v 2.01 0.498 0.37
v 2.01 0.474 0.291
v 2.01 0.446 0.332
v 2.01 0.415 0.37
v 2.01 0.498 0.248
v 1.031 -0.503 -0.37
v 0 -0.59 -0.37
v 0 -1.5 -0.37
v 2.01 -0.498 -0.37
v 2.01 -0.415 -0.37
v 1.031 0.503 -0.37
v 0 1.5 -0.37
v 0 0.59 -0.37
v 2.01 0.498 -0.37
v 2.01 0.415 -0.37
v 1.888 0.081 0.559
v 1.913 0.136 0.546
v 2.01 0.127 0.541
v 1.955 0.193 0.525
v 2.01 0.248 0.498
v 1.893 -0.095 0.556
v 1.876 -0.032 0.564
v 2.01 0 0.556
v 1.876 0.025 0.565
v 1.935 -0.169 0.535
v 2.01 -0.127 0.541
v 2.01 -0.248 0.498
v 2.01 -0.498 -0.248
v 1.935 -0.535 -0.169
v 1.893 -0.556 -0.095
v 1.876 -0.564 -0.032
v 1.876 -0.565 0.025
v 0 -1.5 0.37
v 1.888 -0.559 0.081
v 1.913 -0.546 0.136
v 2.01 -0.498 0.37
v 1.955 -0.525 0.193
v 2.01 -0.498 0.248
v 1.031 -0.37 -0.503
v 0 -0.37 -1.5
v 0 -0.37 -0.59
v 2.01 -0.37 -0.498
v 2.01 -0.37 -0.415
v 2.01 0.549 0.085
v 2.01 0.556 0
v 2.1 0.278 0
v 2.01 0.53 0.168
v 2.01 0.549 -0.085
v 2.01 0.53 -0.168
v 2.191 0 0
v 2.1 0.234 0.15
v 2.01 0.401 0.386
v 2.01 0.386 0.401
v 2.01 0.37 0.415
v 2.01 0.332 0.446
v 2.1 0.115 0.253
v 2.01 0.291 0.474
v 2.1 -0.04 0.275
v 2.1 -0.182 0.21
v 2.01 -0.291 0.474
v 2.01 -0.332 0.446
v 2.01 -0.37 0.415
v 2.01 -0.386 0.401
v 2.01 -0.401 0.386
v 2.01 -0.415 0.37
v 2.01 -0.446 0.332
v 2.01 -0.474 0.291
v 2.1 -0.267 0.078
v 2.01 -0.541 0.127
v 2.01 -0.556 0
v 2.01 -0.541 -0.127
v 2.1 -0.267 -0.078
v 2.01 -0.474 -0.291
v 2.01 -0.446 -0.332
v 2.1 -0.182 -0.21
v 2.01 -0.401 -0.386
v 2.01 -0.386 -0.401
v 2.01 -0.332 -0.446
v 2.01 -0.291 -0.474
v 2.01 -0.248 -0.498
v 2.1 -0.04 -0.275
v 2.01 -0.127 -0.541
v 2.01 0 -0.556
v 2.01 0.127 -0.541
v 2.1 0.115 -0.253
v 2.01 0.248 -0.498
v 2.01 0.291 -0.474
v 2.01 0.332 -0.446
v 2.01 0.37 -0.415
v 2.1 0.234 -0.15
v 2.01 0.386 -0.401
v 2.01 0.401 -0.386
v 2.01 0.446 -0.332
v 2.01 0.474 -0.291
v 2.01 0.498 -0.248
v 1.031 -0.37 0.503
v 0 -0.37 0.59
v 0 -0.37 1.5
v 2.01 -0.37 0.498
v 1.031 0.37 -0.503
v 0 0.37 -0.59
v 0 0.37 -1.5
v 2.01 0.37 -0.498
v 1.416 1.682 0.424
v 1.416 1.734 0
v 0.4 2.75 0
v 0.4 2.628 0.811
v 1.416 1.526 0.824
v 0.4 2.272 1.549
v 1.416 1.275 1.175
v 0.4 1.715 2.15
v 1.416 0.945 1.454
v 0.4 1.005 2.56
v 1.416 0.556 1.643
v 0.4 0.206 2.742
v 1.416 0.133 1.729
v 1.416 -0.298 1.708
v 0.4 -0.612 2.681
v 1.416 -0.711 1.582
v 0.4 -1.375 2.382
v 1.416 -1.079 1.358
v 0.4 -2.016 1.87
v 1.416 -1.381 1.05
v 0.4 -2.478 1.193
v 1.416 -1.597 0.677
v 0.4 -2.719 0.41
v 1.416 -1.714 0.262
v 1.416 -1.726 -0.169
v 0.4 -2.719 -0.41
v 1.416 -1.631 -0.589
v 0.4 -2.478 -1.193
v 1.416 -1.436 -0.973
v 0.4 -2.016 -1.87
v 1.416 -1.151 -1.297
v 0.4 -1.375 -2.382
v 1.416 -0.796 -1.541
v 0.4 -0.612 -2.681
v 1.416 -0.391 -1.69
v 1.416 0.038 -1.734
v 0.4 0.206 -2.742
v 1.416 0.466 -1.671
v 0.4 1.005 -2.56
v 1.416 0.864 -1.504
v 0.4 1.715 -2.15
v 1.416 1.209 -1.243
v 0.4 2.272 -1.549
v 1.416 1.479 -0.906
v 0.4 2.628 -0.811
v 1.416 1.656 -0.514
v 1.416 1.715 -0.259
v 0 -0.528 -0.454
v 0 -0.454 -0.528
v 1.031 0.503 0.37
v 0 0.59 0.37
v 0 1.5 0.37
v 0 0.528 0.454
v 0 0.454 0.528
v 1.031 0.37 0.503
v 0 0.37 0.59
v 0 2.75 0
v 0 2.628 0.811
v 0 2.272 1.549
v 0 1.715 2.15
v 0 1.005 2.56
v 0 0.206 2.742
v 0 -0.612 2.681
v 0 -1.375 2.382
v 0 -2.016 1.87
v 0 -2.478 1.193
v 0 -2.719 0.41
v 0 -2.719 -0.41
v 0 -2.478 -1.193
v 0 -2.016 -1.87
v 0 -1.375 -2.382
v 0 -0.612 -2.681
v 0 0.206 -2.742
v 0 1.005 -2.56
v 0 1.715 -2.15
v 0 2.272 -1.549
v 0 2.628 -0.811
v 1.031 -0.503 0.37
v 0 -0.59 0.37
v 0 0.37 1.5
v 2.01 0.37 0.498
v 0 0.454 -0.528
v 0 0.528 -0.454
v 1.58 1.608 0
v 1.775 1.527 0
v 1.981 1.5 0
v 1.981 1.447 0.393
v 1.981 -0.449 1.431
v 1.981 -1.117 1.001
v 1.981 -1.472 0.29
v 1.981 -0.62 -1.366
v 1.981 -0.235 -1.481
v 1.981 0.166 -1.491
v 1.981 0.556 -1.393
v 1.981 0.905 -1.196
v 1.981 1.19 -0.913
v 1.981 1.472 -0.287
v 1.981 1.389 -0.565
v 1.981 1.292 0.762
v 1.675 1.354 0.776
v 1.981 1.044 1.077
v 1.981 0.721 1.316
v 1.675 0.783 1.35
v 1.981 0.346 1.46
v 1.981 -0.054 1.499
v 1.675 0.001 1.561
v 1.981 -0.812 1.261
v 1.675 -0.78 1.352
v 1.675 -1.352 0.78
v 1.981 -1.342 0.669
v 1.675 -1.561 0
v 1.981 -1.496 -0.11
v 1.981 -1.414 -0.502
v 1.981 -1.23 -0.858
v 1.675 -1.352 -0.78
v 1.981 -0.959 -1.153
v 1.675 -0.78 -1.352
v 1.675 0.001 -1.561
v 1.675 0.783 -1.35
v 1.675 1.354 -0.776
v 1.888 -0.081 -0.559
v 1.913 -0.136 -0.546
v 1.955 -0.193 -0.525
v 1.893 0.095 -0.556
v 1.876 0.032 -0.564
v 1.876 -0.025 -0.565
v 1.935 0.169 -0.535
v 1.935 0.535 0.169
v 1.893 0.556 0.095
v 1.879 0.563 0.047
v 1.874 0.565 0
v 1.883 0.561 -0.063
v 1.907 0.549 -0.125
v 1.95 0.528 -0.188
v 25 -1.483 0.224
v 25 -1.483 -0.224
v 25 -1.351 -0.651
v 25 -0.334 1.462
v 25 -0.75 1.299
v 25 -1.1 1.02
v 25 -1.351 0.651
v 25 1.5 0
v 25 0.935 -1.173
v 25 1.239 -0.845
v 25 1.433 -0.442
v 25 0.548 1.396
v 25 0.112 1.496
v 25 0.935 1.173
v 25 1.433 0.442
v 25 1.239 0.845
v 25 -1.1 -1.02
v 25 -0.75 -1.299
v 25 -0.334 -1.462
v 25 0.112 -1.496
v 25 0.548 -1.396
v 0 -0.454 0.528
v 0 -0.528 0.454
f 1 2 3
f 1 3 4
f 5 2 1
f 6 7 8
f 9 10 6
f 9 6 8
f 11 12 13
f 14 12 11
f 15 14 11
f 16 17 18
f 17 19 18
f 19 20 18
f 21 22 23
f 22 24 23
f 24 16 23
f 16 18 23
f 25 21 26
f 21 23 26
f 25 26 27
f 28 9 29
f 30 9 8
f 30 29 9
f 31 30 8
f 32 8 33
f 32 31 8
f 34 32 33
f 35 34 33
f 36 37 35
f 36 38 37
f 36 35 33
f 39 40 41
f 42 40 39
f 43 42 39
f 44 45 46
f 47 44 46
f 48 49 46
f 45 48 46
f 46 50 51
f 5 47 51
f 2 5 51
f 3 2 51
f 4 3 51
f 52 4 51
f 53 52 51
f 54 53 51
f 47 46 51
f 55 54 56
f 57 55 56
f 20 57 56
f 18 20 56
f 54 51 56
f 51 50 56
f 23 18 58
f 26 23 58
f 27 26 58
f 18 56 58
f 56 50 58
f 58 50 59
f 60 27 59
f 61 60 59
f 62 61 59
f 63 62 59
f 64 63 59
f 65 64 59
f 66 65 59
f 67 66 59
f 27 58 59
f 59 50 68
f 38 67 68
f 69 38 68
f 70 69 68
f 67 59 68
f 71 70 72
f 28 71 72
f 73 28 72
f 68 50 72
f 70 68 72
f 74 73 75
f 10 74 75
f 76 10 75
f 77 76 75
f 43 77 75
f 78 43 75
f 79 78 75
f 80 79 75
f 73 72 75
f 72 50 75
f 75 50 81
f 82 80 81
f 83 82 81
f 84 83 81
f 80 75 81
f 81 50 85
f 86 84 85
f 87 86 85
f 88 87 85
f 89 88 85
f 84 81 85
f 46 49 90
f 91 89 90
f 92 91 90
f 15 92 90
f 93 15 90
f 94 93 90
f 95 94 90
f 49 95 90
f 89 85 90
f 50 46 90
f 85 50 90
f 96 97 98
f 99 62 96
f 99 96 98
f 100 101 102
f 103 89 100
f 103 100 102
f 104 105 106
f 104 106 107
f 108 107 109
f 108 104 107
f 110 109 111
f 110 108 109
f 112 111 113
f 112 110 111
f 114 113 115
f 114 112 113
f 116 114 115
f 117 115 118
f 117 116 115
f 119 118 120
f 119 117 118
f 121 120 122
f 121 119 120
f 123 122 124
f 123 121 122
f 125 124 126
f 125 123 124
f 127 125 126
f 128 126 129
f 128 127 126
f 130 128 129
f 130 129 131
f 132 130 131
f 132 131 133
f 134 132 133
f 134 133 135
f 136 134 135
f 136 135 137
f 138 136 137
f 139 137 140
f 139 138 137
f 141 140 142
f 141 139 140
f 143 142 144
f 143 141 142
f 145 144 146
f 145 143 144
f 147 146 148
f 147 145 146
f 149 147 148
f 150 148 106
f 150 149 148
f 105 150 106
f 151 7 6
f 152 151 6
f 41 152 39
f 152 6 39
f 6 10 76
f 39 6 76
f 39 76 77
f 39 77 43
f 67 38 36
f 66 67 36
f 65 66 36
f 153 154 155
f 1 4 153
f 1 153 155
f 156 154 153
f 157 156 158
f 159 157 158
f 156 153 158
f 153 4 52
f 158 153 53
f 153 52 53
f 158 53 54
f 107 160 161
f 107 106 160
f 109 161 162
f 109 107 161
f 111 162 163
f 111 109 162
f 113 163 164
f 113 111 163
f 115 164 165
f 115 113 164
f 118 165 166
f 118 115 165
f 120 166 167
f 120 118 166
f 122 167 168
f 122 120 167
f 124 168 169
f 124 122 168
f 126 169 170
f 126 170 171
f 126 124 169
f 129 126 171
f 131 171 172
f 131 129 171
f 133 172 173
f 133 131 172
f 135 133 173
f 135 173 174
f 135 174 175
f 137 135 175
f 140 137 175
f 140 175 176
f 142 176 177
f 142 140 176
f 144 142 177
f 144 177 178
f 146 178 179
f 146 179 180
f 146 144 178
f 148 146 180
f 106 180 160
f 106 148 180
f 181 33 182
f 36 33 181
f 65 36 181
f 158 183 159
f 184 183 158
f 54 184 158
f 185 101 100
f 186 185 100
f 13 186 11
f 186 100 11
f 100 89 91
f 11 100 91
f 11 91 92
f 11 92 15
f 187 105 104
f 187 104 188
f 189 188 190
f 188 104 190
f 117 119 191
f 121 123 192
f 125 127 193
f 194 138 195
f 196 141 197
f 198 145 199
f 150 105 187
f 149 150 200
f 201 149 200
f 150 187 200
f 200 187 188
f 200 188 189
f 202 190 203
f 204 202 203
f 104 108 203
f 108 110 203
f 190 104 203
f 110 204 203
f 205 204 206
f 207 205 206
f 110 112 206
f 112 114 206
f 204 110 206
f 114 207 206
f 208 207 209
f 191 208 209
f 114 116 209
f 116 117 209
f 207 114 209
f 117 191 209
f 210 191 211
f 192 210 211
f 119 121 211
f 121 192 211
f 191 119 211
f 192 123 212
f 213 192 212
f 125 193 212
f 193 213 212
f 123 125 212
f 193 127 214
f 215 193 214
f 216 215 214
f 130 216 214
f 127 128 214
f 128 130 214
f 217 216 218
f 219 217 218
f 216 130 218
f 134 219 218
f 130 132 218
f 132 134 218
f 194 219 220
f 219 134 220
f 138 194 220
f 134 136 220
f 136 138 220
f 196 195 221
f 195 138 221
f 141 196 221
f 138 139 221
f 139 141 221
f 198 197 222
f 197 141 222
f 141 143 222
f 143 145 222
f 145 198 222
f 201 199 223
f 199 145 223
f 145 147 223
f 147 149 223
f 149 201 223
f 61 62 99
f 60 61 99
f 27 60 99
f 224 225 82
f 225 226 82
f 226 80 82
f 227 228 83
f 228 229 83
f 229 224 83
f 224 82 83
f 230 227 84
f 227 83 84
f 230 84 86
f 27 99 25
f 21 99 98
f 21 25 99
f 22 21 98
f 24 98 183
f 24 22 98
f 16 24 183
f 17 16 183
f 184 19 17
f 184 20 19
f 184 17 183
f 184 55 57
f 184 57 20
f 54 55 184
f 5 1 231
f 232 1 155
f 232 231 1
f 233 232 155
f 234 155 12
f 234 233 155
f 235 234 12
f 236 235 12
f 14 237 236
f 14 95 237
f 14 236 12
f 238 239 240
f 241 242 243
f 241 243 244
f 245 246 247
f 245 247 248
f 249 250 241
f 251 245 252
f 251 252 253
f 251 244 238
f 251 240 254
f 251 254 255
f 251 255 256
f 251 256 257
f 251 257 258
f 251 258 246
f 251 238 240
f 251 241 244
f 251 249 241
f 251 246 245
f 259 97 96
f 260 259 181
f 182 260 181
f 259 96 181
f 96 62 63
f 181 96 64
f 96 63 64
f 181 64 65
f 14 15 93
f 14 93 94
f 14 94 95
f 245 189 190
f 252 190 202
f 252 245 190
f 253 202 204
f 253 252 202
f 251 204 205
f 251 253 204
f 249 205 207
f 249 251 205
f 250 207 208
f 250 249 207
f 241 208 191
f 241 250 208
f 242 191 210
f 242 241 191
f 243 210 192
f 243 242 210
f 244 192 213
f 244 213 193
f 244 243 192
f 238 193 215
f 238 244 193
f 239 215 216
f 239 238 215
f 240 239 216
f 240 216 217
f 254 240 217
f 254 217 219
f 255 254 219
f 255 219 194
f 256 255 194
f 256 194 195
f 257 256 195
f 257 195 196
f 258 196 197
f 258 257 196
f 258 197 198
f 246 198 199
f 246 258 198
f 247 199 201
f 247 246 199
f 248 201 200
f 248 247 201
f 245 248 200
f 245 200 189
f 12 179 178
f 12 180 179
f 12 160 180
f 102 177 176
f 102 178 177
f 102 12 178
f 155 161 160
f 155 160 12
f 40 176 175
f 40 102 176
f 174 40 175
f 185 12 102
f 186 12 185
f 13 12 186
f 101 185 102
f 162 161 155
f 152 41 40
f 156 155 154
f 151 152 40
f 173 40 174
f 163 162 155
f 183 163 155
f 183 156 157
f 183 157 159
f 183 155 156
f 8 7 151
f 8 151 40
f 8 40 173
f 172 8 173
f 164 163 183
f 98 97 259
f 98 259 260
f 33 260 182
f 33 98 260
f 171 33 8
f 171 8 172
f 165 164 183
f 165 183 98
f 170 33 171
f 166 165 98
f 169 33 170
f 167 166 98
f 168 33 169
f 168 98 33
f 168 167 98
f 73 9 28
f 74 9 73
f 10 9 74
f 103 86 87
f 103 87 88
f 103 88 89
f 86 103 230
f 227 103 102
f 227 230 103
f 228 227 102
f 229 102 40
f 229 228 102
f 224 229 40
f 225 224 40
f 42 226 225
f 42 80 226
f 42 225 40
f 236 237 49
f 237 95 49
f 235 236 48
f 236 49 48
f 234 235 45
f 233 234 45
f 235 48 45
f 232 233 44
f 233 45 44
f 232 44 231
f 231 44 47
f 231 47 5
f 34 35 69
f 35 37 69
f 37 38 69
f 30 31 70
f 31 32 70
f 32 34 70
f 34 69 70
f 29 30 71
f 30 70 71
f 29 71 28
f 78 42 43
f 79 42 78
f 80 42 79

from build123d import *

# Parameters (mm, degrees)
FILLET1_R    = 0.8
SKETCH3_W    = 0.74
SKETCH3_H    = 3
SKETCH4_W    = 0.74
SKETCH4_H    = 0.995702004
RECPAT_COUNT = 2
RECPAT_ANGLE = 90


with BuildPart() as part:
    # BodySke → Base-Revolve (revolve)
    with BuildSketch(Plane.XY):
        Polygon((0, 0), (0, 2.75), (0.4, 2.75), (1.65, 1.5), (25, 1.5), (25, 0), align=None)
    revolve(axis=Axis((-6.35, 0, 0), (1, 0, 0)))

    # Fillet1
    fillet1_edges = [part.edges().sort_by_distance(p)[0] for p in [
        (1.65, -1.5, 0),
    ]]
    fillet(fillet1_edges, radius=FILLET1_R)

    # Sketch3 → Recess section 0
    with BuildSketch(Plane.ZY):
        Rectangle(SKETCH3_W, SKETCH3_H)
    # Sketch4 → Recess section 1
    with BuildSketch(Plane.ZY.offset(-2.01)):
        Rectangle(SKETCH4_W, SKETCH4_H)
    recess = loft(mode=Mode.SUBTRACT)

    # RecPat: Recess ×2 about axis
    recpat_axis = Axis((0, 0, 0), (1, 0, 0))
    for i in range(1, RECPAT_COUNT):
        add(recess.rotate(recpat_axis, i * RECPAT_ANGLE / (RECPAT_COUNT - 1)), mode=Mode.SUBTRACT)

    # RecCorSke → RecessCore (revolve, cut)
    with BuildSketch(Plane.XY):
        Polygon((0, 0), (0, 0.696552892), (2.01, 0.556), (2.190655351, 0), align=None)
    revolve(axis=Axis((-3.175, 0, 0), (1, 0, 0)), mode=Mode.SUBTRACT)


solid = part.part
